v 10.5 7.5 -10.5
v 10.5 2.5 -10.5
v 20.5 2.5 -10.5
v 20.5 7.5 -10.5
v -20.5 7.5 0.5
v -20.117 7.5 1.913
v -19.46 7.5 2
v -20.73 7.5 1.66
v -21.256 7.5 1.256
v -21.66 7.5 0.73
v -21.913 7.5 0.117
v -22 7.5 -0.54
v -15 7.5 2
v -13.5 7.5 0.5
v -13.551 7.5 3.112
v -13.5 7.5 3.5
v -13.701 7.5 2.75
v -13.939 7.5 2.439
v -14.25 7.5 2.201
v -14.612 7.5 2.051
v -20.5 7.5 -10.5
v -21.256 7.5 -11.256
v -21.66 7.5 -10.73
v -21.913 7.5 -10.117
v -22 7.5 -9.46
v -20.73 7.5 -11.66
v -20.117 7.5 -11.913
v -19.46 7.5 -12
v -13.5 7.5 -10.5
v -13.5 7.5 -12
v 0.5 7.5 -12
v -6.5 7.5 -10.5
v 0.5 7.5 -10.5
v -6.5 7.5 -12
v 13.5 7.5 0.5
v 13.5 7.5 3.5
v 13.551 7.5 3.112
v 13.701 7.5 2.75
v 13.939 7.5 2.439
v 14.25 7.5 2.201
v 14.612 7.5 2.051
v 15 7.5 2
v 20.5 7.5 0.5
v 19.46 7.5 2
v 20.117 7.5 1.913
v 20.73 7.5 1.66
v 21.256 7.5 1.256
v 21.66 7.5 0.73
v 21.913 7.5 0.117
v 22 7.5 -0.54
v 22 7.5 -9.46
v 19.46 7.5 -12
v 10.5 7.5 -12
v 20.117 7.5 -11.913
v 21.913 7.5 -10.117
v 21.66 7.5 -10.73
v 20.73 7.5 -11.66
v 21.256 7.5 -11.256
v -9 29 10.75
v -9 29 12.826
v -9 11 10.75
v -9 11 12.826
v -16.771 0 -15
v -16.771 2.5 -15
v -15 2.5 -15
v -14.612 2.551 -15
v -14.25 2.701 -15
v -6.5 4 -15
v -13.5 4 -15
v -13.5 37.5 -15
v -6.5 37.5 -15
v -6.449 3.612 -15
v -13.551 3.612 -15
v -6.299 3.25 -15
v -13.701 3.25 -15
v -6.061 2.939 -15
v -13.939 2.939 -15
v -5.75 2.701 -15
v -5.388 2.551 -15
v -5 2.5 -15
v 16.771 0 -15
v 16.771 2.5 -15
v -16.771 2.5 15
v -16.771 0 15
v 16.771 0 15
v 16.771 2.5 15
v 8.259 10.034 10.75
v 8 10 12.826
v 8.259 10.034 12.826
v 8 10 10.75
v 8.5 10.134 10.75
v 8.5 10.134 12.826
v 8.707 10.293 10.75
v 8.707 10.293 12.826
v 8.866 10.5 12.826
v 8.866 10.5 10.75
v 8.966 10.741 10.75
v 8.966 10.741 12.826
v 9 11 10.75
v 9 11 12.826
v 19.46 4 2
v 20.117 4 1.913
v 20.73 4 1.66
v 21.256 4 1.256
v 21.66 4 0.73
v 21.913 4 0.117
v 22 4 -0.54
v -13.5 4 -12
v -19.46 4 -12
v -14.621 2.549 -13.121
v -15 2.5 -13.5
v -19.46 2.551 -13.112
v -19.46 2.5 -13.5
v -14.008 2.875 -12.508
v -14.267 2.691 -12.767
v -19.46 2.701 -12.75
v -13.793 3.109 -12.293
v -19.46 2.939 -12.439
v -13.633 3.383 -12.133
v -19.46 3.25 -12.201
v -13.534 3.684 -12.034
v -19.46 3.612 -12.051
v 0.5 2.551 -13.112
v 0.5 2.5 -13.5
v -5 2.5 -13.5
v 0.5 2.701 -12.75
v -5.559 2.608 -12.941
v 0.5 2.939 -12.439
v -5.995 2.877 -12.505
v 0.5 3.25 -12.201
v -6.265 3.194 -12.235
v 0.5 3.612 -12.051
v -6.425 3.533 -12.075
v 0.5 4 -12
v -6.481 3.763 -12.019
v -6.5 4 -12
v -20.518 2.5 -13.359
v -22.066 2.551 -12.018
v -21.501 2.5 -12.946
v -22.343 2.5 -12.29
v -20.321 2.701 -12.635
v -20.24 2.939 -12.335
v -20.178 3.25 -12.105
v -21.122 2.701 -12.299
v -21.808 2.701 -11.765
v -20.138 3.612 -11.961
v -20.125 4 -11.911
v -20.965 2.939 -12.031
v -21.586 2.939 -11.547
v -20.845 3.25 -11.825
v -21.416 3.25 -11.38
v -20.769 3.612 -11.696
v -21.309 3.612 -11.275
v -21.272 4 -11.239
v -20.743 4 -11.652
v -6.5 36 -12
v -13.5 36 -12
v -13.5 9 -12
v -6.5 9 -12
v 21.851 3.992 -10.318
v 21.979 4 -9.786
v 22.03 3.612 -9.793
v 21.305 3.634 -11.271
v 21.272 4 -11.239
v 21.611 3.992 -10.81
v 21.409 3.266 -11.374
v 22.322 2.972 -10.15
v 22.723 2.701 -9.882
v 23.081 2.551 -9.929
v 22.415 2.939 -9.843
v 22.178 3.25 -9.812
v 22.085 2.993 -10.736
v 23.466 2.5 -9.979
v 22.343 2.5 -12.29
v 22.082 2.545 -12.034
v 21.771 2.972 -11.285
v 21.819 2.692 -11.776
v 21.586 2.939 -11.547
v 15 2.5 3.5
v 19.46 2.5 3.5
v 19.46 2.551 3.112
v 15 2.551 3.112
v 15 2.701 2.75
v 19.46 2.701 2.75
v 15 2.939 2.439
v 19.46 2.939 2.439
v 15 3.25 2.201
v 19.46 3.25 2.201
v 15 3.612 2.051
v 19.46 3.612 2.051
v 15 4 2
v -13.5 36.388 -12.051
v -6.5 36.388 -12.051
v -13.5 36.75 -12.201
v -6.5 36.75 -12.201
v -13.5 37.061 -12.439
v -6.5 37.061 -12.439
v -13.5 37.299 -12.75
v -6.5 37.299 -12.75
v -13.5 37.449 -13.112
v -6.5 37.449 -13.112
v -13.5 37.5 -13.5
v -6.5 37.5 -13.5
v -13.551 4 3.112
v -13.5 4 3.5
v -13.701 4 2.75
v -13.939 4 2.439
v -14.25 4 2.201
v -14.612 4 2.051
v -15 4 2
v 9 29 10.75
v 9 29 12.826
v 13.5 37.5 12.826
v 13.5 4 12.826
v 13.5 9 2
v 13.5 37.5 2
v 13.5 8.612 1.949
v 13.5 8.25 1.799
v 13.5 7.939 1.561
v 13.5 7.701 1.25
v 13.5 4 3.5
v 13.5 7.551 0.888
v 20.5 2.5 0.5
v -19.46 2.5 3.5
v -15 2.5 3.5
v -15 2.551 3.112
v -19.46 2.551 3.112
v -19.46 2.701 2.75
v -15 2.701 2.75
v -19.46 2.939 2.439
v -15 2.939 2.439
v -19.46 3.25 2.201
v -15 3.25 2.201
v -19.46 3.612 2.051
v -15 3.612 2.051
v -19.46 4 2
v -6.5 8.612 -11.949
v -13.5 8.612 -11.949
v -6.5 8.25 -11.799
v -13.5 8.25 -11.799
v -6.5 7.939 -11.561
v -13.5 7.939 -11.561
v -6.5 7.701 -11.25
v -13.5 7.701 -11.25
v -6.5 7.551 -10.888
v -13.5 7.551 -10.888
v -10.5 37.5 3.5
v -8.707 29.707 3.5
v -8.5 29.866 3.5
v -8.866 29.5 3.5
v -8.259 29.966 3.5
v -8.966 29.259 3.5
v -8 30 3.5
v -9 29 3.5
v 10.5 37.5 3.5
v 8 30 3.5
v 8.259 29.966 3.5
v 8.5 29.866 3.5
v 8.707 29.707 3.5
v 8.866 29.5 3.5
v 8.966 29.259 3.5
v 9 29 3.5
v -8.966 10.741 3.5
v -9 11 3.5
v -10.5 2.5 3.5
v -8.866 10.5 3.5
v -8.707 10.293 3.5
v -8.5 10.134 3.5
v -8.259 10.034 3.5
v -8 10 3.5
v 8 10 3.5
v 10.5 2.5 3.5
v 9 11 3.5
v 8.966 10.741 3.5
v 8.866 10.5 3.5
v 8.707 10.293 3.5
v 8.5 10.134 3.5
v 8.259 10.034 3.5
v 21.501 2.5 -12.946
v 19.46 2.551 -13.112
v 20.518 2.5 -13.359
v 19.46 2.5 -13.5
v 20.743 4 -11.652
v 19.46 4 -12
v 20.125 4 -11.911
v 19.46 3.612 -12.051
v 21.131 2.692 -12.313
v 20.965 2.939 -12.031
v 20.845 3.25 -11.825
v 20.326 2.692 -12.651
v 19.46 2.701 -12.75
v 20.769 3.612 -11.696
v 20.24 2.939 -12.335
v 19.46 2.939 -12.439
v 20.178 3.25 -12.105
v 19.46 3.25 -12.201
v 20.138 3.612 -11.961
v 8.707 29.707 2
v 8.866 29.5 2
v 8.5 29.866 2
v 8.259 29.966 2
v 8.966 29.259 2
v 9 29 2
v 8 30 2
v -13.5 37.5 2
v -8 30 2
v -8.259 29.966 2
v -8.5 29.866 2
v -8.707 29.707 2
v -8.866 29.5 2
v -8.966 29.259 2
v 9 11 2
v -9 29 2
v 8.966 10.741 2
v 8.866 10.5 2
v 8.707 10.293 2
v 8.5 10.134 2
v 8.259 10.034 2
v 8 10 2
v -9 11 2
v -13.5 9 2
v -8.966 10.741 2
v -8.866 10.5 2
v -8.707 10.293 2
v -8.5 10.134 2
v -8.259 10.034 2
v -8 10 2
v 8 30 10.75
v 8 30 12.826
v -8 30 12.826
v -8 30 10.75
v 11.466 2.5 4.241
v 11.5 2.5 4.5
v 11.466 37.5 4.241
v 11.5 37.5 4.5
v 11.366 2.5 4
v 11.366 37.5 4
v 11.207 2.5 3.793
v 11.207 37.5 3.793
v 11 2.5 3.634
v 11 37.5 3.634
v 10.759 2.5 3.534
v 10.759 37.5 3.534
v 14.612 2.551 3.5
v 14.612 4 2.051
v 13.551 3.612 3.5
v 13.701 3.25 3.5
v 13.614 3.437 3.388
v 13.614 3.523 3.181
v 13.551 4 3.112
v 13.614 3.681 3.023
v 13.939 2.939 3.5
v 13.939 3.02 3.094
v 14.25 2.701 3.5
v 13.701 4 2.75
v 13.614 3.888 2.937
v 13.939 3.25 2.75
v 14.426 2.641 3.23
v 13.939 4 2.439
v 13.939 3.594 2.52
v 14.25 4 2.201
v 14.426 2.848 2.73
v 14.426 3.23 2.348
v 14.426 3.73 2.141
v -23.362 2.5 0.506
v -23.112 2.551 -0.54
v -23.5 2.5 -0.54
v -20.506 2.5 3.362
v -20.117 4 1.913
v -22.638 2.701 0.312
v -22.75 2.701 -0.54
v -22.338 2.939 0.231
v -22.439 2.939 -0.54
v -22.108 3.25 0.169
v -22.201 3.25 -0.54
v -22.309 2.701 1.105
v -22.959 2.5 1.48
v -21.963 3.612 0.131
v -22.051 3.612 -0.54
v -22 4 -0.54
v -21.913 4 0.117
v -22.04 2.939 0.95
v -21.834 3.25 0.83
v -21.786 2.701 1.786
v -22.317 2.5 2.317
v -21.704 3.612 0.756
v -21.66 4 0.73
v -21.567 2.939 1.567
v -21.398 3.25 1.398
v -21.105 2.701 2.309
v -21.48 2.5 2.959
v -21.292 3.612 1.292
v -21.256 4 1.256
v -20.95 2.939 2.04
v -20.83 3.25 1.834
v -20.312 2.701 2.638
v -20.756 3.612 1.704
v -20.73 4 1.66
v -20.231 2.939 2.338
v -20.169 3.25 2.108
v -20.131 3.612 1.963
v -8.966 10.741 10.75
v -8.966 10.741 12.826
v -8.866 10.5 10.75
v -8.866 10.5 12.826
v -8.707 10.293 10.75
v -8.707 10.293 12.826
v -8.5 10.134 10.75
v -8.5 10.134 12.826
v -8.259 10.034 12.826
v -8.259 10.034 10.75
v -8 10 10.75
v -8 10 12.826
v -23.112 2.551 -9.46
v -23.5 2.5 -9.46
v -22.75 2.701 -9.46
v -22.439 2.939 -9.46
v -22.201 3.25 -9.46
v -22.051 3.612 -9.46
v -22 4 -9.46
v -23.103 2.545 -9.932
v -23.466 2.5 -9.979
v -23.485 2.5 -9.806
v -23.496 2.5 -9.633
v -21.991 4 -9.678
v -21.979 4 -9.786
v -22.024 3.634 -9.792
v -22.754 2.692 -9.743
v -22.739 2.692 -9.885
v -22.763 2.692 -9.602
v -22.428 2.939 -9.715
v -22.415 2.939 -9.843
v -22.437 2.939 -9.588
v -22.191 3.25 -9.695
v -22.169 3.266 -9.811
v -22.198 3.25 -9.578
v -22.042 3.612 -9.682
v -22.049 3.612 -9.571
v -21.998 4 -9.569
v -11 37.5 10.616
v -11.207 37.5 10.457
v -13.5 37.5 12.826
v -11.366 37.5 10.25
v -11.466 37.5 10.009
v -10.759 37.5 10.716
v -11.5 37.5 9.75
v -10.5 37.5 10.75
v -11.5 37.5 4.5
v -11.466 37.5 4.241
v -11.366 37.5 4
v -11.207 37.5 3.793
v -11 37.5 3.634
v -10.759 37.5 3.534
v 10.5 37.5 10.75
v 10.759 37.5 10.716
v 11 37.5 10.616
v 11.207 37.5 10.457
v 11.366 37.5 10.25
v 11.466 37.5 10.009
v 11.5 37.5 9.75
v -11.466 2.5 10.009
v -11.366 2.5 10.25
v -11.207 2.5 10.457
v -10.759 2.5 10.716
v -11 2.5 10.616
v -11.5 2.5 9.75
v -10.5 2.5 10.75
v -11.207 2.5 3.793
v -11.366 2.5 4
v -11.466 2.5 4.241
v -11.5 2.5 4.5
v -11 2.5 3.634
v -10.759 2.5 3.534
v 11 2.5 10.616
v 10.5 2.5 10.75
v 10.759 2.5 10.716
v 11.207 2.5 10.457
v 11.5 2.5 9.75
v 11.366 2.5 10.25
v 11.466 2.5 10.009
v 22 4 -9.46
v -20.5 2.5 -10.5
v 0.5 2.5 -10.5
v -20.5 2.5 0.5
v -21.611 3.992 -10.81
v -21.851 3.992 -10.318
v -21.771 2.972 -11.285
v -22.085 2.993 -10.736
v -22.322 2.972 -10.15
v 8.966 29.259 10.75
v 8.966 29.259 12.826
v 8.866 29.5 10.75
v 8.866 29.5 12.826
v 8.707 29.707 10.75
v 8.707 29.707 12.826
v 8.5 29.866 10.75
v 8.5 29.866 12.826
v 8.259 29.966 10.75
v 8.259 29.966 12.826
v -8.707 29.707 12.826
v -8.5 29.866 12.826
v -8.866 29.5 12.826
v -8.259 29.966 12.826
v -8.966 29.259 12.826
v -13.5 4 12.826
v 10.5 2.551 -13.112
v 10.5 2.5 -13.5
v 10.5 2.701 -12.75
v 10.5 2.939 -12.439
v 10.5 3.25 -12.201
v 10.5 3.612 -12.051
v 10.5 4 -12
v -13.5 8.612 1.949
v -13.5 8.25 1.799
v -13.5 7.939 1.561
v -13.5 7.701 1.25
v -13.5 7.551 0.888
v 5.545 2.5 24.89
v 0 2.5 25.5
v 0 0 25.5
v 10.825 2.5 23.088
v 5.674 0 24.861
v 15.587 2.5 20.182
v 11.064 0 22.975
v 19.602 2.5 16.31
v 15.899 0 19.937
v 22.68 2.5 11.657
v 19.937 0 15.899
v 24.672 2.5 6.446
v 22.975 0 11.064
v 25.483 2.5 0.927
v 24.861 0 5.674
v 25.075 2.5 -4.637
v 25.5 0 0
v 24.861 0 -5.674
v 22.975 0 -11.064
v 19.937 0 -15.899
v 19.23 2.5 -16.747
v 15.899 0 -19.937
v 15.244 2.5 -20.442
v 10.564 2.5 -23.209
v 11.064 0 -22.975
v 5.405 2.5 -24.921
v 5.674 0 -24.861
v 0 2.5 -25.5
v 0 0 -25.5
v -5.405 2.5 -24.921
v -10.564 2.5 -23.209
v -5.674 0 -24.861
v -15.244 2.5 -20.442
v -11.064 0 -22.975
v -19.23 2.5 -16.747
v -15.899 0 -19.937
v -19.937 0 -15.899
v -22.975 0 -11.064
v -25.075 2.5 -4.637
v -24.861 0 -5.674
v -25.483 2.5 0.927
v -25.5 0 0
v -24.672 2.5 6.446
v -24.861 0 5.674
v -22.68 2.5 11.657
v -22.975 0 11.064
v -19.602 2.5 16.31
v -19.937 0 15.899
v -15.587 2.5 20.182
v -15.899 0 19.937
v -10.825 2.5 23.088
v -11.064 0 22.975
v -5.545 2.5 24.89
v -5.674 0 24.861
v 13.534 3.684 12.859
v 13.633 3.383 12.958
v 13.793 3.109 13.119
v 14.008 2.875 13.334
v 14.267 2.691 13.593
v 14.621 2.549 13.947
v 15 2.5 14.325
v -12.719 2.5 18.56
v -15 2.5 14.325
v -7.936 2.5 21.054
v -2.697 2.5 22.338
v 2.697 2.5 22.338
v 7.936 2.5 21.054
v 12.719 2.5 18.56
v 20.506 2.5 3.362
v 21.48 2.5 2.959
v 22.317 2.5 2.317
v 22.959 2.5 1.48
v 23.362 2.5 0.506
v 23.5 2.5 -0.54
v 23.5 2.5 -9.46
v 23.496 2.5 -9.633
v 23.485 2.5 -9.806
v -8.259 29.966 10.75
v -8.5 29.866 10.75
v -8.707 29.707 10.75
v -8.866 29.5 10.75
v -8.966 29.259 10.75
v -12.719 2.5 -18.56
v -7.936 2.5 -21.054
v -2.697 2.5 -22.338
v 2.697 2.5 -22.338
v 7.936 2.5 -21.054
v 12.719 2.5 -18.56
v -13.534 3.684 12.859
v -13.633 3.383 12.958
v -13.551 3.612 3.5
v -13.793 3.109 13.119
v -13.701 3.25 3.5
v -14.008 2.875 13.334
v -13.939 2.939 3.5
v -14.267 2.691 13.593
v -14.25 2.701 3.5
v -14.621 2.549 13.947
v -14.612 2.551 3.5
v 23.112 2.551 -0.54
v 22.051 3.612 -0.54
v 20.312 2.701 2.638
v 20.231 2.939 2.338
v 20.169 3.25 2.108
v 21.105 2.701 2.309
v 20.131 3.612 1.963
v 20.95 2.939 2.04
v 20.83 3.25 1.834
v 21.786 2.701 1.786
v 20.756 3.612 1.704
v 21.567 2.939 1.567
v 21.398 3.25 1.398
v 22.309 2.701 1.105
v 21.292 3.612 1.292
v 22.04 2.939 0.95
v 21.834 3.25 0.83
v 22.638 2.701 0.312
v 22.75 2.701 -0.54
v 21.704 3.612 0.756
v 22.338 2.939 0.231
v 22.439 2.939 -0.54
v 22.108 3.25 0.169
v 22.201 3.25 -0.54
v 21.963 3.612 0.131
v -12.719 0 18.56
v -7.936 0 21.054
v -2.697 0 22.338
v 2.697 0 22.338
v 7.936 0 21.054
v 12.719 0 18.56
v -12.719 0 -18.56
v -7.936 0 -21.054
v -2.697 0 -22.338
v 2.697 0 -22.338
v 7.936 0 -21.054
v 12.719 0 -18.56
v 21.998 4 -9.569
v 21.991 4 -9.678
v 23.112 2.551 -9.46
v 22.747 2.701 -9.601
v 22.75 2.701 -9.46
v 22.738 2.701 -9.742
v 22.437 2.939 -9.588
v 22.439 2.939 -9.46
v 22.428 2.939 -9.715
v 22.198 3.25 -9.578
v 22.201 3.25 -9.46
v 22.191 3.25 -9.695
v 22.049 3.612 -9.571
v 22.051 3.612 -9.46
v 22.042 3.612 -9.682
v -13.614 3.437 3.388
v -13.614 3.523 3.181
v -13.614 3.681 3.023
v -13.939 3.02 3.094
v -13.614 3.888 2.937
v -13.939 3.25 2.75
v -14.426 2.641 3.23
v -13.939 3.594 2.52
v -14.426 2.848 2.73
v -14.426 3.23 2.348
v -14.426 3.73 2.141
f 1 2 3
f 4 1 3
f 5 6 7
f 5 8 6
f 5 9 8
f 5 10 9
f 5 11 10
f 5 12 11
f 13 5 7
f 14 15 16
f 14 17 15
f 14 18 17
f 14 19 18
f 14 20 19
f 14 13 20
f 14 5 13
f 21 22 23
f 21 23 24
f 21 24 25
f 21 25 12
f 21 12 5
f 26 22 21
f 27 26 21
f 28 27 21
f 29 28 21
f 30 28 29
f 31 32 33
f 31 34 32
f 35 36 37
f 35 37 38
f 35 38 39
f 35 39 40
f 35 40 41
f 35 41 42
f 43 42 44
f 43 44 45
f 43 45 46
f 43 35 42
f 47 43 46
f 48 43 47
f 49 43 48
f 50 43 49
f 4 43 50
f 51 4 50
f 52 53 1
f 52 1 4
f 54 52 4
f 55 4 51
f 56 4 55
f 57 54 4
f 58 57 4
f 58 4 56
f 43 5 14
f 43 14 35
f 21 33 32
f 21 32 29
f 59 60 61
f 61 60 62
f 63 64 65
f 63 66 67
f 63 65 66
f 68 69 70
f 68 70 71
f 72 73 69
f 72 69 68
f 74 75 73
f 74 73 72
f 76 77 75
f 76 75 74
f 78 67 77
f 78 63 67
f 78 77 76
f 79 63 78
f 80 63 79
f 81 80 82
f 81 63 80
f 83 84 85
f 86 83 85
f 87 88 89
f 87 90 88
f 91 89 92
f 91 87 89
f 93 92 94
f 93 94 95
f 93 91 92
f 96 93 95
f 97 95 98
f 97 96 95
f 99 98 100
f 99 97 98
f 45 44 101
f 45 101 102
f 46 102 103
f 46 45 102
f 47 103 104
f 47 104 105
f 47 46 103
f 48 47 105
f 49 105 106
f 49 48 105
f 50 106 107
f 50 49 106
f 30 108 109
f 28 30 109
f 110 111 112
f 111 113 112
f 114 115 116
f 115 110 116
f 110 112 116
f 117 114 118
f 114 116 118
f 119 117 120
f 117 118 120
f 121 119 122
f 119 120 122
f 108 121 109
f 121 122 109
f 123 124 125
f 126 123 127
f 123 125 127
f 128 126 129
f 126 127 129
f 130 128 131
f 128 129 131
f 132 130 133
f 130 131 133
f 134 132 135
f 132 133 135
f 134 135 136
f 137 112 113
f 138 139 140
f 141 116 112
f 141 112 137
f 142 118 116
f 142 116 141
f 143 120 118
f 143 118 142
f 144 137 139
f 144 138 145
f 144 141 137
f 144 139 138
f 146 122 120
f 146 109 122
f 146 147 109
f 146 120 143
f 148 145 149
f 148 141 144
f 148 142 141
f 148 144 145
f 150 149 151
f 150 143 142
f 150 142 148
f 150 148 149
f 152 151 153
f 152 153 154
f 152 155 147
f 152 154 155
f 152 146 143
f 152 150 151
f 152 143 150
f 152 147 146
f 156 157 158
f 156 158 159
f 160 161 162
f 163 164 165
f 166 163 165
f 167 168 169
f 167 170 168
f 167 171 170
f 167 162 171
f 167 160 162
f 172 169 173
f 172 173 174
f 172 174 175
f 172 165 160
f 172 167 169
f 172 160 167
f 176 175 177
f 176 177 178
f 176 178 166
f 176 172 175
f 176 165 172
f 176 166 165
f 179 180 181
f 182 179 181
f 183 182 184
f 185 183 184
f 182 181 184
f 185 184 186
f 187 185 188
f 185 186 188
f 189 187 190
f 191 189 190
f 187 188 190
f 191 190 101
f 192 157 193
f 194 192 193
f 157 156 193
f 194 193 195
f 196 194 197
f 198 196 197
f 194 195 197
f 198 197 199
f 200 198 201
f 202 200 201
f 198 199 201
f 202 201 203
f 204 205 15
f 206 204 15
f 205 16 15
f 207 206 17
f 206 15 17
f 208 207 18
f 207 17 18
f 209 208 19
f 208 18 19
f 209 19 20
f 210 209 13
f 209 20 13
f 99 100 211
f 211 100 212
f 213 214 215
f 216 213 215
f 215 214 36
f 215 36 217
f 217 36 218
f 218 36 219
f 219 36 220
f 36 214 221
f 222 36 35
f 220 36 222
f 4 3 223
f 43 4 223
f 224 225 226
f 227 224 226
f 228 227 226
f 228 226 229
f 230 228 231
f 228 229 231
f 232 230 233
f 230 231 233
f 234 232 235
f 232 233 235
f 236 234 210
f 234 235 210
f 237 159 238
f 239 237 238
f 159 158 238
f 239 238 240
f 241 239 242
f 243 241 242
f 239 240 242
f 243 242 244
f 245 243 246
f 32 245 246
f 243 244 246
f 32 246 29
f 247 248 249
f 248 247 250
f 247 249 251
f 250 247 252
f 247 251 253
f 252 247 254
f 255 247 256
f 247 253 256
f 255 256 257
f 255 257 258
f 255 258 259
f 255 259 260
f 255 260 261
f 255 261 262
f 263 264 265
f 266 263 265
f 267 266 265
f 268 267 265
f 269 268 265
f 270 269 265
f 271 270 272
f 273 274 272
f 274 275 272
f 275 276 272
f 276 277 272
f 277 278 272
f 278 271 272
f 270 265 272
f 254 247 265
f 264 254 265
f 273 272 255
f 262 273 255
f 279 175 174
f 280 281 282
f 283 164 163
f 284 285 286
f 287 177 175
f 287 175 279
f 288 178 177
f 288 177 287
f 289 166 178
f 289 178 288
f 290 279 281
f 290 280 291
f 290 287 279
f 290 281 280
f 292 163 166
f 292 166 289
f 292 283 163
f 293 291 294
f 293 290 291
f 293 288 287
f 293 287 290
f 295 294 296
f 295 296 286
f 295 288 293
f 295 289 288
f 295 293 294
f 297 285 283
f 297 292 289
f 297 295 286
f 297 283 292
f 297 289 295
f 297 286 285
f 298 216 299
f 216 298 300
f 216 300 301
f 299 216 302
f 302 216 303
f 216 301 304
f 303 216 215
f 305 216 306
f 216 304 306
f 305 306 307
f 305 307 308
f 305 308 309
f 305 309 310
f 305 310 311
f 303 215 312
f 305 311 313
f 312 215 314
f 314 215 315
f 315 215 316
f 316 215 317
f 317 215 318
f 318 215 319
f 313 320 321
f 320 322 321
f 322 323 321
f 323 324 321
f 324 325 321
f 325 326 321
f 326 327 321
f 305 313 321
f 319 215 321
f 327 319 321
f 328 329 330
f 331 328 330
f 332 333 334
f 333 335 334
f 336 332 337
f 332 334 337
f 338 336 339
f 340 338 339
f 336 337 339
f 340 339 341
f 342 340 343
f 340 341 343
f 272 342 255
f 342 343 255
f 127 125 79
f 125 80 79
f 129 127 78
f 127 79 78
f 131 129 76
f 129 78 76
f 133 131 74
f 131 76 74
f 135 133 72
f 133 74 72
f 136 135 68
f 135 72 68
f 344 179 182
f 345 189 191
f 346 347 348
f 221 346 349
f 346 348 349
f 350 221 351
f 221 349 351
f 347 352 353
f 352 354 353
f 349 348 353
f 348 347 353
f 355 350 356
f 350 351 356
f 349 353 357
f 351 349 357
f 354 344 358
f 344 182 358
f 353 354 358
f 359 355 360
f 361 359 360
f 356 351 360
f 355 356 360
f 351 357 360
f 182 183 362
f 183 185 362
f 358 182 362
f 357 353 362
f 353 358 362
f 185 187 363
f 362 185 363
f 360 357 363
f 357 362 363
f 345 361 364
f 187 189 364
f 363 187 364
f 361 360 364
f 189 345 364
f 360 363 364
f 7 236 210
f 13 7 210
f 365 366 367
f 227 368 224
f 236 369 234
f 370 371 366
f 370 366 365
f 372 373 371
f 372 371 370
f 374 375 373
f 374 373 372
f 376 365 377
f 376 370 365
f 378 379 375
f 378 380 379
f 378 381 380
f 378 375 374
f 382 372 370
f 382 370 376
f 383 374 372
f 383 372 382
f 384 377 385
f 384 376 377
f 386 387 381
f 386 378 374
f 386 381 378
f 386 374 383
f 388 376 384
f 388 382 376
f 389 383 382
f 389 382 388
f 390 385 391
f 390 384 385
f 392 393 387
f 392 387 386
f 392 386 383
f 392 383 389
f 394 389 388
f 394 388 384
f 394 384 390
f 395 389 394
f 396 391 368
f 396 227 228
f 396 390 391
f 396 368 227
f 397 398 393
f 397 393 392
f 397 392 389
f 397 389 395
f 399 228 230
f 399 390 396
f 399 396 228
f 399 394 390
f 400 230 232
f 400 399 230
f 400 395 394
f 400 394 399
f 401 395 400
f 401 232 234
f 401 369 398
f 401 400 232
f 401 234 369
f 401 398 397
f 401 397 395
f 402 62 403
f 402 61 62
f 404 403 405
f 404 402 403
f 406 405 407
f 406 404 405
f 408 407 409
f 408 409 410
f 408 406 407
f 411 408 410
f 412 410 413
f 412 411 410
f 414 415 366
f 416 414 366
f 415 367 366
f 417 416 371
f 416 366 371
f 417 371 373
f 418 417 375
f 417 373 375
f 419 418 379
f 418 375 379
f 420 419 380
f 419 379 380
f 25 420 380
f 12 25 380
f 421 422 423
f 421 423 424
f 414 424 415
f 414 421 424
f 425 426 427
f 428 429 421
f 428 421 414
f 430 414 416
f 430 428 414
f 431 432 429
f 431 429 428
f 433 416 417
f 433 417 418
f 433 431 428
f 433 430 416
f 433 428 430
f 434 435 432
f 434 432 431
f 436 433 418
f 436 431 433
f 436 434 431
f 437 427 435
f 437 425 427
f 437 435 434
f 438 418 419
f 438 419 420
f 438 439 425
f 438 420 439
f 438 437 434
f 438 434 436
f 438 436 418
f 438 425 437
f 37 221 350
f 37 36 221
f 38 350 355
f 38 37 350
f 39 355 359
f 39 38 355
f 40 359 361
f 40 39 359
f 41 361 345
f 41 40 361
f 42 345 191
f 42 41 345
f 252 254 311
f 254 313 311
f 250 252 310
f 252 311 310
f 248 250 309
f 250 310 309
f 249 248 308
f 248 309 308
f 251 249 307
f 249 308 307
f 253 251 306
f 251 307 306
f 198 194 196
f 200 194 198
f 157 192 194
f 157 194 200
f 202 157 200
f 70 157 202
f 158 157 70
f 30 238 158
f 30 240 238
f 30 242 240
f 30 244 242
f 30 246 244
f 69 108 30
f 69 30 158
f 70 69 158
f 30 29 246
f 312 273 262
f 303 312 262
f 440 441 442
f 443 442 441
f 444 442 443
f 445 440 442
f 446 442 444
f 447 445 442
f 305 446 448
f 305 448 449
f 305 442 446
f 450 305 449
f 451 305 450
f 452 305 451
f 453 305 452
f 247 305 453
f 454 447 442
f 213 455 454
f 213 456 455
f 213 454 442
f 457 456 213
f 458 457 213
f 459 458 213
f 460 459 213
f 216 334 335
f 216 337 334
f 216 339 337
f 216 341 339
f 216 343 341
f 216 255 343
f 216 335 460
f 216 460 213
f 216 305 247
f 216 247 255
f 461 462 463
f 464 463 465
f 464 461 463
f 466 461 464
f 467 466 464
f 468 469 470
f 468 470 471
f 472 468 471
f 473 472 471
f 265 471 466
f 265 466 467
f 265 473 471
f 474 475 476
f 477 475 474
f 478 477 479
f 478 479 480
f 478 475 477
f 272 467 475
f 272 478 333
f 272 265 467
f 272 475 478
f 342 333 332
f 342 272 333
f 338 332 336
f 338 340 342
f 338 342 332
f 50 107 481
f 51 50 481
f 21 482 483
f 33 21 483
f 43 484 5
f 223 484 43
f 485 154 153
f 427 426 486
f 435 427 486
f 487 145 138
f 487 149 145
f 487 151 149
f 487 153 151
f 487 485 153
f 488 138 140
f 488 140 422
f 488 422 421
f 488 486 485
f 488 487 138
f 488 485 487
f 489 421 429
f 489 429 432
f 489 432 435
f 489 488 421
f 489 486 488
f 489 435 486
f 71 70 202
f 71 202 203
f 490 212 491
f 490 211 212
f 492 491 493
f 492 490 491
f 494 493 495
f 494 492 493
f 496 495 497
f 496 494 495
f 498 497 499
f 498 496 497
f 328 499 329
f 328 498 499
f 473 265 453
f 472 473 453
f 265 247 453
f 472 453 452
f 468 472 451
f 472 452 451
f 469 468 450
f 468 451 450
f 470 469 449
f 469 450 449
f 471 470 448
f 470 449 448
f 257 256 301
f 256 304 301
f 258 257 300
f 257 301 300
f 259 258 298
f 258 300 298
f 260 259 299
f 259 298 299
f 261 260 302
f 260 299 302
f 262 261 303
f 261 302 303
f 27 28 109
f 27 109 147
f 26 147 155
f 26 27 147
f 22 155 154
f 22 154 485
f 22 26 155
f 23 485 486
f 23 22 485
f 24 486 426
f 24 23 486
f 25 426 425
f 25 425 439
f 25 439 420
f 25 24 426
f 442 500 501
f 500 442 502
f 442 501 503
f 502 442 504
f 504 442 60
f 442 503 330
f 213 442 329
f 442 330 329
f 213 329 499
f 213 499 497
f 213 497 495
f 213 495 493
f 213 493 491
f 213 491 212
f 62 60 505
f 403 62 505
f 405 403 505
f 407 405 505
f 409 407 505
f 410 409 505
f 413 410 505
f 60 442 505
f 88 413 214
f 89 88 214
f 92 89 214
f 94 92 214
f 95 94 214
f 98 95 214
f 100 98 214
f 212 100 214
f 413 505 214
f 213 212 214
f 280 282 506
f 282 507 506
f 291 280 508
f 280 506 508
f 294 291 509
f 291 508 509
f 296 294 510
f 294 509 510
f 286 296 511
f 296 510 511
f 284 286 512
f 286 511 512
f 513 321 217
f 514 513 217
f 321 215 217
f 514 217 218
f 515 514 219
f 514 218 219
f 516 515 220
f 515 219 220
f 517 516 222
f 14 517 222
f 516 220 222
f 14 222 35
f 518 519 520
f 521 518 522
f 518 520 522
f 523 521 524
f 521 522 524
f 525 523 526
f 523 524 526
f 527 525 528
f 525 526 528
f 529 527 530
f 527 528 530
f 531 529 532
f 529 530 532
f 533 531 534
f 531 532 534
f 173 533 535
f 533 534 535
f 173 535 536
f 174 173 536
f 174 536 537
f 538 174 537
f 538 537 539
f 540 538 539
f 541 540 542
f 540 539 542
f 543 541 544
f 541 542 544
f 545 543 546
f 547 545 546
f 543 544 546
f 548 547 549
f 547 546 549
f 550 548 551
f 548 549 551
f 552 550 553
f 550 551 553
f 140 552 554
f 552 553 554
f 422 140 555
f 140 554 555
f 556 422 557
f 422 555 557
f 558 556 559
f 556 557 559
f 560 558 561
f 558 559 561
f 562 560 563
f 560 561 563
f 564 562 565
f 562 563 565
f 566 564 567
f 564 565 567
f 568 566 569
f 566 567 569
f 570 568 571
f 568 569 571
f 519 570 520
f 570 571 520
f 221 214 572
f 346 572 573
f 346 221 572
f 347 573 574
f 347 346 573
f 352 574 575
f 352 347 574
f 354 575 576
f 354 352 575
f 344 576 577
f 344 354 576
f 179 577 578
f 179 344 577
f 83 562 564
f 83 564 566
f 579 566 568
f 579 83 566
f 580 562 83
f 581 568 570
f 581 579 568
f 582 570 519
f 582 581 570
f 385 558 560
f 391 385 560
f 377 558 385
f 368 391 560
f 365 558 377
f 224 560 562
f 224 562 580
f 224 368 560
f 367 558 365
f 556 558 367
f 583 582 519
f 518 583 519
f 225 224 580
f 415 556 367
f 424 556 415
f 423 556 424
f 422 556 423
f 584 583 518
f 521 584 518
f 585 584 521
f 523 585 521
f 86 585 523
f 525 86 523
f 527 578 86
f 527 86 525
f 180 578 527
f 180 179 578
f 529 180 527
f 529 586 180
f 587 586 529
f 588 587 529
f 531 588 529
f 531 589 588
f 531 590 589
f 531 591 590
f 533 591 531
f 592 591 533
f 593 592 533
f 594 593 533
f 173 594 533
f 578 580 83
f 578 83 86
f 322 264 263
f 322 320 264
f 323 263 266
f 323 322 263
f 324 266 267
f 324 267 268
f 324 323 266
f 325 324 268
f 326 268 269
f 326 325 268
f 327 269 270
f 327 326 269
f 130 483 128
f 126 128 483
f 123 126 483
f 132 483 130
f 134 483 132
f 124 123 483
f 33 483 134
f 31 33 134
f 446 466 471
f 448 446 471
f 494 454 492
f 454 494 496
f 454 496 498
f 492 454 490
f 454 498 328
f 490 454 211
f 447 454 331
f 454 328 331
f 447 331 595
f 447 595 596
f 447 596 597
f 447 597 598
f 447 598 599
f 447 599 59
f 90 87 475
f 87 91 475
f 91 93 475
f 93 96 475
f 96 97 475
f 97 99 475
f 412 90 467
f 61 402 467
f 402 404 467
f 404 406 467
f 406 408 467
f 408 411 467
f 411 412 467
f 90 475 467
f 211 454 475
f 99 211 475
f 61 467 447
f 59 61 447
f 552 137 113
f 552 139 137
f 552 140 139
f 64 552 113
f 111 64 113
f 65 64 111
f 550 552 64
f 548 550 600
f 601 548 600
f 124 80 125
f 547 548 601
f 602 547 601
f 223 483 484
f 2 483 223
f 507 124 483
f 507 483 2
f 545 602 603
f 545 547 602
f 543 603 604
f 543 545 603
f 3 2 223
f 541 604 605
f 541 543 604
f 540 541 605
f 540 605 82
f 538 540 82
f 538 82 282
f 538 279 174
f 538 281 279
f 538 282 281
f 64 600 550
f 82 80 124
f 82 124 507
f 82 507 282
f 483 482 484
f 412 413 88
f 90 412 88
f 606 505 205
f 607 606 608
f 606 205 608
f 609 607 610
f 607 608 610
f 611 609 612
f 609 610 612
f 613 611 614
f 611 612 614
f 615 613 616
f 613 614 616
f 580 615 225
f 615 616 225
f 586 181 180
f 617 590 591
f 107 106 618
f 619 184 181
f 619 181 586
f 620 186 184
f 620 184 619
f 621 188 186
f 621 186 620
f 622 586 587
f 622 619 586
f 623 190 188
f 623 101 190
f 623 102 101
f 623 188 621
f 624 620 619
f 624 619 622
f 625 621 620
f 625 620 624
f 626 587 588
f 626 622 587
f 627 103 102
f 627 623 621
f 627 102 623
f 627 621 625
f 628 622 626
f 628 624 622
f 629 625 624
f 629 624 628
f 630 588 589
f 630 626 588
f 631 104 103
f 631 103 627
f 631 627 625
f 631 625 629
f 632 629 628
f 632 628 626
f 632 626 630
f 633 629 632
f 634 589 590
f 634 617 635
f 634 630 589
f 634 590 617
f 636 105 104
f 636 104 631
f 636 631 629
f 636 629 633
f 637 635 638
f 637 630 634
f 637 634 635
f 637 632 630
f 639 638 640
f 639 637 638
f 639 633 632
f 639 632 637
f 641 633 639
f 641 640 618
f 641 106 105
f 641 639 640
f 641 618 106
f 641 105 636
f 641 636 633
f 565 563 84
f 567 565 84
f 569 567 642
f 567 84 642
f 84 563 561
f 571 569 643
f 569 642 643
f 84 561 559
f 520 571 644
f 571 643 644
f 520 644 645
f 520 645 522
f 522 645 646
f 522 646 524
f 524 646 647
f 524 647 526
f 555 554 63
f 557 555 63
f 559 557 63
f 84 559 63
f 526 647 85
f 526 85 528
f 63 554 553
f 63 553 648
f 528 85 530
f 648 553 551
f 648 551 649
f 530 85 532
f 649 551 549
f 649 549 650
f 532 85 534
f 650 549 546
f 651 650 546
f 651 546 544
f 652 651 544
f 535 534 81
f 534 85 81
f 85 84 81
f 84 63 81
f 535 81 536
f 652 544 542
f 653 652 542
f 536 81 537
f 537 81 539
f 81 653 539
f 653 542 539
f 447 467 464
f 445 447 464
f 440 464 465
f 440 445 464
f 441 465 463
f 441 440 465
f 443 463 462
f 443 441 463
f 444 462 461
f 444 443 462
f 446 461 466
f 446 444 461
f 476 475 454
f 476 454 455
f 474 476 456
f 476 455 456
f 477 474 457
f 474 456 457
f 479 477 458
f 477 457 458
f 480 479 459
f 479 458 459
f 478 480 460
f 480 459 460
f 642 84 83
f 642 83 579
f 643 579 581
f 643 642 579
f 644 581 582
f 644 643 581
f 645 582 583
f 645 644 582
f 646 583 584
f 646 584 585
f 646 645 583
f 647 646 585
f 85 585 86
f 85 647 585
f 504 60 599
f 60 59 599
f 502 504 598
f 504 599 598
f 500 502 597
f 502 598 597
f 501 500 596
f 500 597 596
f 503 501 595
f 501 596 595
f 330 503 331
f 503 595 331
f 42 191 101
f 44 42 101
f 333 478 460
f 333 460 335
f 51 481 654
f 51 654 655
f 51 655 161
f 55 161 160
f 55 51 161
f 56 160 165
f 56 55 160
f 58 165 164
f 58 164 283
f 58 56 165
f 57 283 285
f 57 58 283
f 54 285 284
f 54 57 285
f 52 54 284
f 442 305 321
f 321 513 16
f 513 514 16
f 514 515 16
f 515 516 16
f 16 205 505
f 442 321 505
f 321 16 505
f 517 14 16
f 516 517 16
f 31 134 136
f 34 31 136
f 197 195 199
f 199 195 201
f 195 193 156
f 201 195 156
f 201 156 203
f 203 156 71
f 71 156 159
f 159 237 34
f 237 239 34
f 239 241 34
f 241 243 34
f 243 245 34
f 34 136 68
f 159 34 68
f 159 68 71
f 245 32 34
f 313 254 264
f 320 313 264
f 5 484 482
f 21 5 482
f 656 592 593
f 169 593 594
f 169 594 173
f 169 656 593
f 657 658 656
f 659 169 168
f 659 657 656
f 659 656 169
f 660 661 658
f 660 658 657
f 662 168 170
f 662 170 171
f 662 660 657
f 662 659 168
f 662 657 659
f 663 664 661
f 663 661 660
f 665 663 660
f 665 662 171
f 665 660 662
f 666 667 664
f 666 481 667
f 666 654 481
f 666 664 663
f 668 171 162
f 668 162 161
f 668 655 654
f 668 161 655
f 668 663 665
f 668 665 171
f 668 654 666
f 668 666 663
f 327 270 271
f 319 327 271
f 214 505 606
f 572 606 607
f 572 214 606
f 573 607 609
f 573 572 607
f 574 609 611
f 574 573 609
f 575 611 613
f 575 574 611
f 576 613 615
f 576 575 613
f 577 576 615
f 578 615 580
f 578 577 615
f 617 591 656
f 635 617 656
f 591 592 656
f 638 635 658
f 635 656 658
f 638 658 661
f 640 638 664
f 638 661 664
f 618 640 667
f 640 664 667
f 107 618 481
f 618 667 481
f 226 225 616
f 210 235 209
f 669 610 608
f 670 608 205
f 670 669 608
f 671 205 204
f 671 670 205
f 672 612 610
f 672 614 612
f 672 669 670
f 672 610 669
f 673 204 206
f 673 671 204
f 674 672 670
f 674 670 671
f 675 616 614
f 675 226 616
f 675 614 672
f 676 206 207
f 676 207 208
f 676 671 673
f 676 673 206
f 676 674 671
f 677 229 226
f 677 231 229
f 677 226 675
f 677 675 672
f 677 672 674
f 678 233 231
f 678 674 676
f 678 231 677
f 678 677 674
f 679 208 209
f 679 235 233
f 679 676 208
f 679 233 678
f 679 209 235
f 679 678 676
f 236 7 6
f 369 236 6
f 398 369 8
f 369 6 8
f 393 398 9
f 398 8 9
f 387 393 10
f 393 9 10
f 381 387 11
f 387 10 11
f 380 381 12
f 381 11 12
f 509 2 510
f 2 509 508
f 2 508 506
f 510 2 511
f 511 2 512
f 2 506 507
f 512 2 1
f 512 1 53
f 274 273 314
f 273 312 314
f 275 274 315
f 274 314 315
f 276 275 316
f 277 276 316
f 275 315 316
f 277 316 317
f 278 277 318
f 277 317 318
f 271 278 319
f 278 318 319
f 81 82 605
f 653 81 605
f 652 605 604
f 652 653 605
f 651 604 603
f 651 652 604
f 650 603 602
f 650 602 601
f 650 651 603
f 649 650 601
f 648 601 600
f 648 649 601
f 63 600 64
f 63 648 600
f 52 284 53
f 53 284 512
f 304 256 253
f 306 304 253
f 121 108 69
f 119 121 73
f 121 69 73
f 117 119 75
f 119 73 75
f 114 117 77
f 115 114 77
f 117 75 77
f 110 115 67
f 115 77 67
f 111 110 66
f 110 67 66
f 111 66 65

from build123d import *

# Parameters (mm, degrees)
SKETCH1_R           = 25.5
SKETCH1_R_2         = 22.5
SKETCH1_W           = 33.541019662
SKETCH1_H           = 30
BOSS_EXTRUDE1_DEPTH = 2.5
SKETCH2_W           = 1.5
SKETCH2_H           = 1.5
SKETCH2_W_2         = 41
BOSS_EXTRUDE2_DEPTH = 5
FILLET1_R           = 2.54
SKETCH3_W           = 10
SKETCH3_H           = 1.5
CUT_EXTRUDE1_DEPTH  = 5
SKETCH4_W           = 7
SKETCH4_H           = 3
BOSS_EXTRUDE3_DEPTH = 35
FILLET2_R           = 1.5
FILLET3_R           = 1.5
SKETCH5_W           = 11.5
SKETCH5_H           = 0.25
SKETCH5_H_2         = 1.25
SKETCH5_W_2         = 2
SKETCH5_H_3         = 7.25
BOSS_EXTRUDE5_DEPTH = 35
FILLET4_R           = 1.5
FILLET5_R           = 1.5
FILLET6_R           = 1
SKETCH6_W           = 9
SKETCH6_H           = 10
CUT_EXTRUDE3_DEPTH  = 19.76
FILLET7_R           = 1


with BuildPart() as part:
    # Sketch1 → Boss-Extrude1 (new body)
    # profile 1 of 4: a face of its own
    with BuildSketch(Plane(origin=(0, 0, 0), x_dir=(1, 0, 0), z_dir=(0, 1, 0))):
        with Locations(Location((0, 0, 0), (0, 0, 270))):
            Circle(SKETCH1_R)
        Circle(SKETCH1_R_2, mode=Mode.SUBTRACT)
    # profile 2 of 4: a face of its own
    with BuildSketch(Plane(origin=(0, 0, 0), x_dir=(1, 0, 0), z_dir=(0, 1, 0))):
        Rectangle(SKETCH1_W, SKETCH1_H)
    # profile 3 of 4: a face of its own
    with BuildSketch(Plane(origin=(0, 0, 0), x_dir=(1, 0, 0), z_dir=(0, 1, 0))):
        with BuildLine():
            ThreePointArc((22.5, 0), (21.018878077, 8.02849702), (16.770509831, 15))
            Line((16.770509831, 15), (16.770509831, -15))
            ThreePointArc((16.770509831, -15), (21.018878077, -8.02849702), (22.5, 0))
        make_face()
    # profile 4 of 4: a face of its own
    with BuildSketch(Plane(origin=(0, 0, 0), x_dir=(1, 0, 0), z_dir=(0, 1, 0))):
        with BuildLine():
            Line((-16.770509831, -15), (-16.770509831, 15))
            ThreePointArc((-16.770509831, 15), (-22.5, 0), (-16.770509831, -15))
        make_face()
    extrude(amount=BOSS_EXTRUDE1_DEPTH)

    # Sketch2 → Boss-Extrude2 (add)
    with BuildSketch(Plane(origin=(0, 2.5, 0), x_dir=(1, 0, 0), z_dir=(0, 1, 0))):
        Polygon((-20.5, -0.5), (-20.5, 5.5), (-20.5, 10.5), (-22, 10.5), (-22, -0.5), align=None)
        with Locations((-21.25, -1.25)):
            Rectangle(SKETCH2_W, SKETCH2_H)
        with Locations((0, -1.25)):
            Rectangle(SKETCH2_W_2, SKETCH2_H)
        Polygon((20.5, 10.5), (20.5, 5.5), (20.5, -0.5), (20.5, -2), (22, -2), (22, 12), (20.5, 12), align=None)
        Polygon((-20.5, 10.5), (20.5, 10.5), (20.5, 12), (-22, 12), (-22, 10.5), align=None)
    extrude(amount=BOSS_EXTRUDE2_DEPTH)

    # Fillet1
    fillet1_edges = [part.edges().sort_by_distance(p)[0] for p in [
        (-22, 5, -12),
        (-22, 5, 2),
        (22, 5, 2),
        (22, 5, -12),
    ]]
    fillet(fillet1_edges, radius=FILLET1_R)

    # Sketch3 → Cut-Extrude1 (cut)
    with BuildSketch(Plane(origin=(0, 7.5, 0), x_dir=(1, 0, 0), z_dir=(0, 1, 0))):
        with Locations((5.5, 11.25)):
            Rectangle(SKETCH3_W, SKETCH3_H)
    extrude(amount=-CUT_EXTRUDE1_DEPTH, mode=Mode.SUBTRACT)

    # Sketch4 → Boss-Extrude3 (add)
    with BuildSketch(Plane(origin=(0, 2.5, 0), x_dir=(1, 0, 0), z_dir=(0, 1, 0))):
        with Locations((-10, 13.5)):
            Rectangle(SKETCH4_W, SKETCH4_H)
    extrude(amount=BOSS_EXTRUDE3_DEPTH)

    # Fillet2
    fillet2_edges = [part.edges().sort_by_distance(p)[0] for p in [
        (-10, 7.5, -12),
        (-3, 2.5, -12),
        (-6.5, 2.5, -13.5),
        (-13.5, 2.5, -13.5),
        (0, 2.5, 2),
        (-22, 2.5, -5),
        (22, 2.5, -5),
        (-16.48, 2.5, -12),
        (-21.256051224, 2.5, 1.256051224),
        (21.256051224, 2.5, 1.256051224),
        (21.256051224, 2.5, -11.256051224),
        (-21.256051224, 2.5, -11.256051224),
        (14.98, 2.5, -12),
    ]]
    fillet(fillet2_edges, radius=FILLET2_R - 0.0001)  # a hair under: the kernel refuses the full size

    # Fillet3
    fillet3_edges = [part.edges().sort_by_distance(p)[0] for p in [
        (-10, 37.5, -12),
    ]]
    fillet(fillet3_edges, radius=FILLET3_R)

    # Sketch5 → Boss-Extrude5 (add)
    with BuildSketch(Plane(origin=(0, 2.5, 0), x_dir=(1, 0, 0), z_dir=(0, 1, 0))):
        with Locations((-5.75, -2.125)):
            Rectangle(SKETCH5_W, SKETCH5_H)
        with Locations((-5.75, -2.875)):
            Rectangle(SKETCH5_W, SKETCH5_H_2)
        with Locations((5.75, -2.875)):
            Rectangle(SKETCH5_W, SKETCH5_H_2)
        with Locations((5.75, -2.125)):
            Rectangle(SKETCH5_W, SKETCH5_H)
        Polygon((13.5, -2), (11.5, -2), (11.5, -2.25), (11.5, -3.5), (13.5, -3.5), align=None)
        with Locations((12.5, -7.125)):
            Rectangle(SKETCH5_W_2, SKETCH5_H_3)
        Polygon((11.5, -10.75), (-11.5, -10.75), (-13.5, -10.75), (-13.5, -12.825519341), (13.5, -12.825519341), (13.5, -10.75), align=None)
        with Locations((-12.5, -7.125)):
            Rectangle(SKETCH5_W_2, SKETCH5_H_3)
        Polygon((-11.5, -2.25), (-11.5, -2), (-13.5, -2), (-13.5, -3.5), (-11.5, -3.5), align=None)
    extrude(amount=BOSS_EXTRUDE5_DEPTH)

    # Fillet4
    fillet4_edges = [part.edges().sort_by_distance(p)[0] for p in [
        (0, 7.5, 2),
    ]]
    fillet(fillet4_edges, radius=FILLET4_R - 0.0001)  # a hair under: the kernel refuses the full size

    # Fillet5
    fillet5_edges = [part.edges().sort_by_distance(p)[0] for p in [
        (-13.5, 2.939310539, 2.439310539),
        (13.5, 2.939310539, 2.439310539),
        (13.5, 2.5, 8.16270967),
        (13.5, 5.74995, 2),
        (-13.5, 5.74995, 2),
        (0, 2.5, 12.825519341),
        (-13.5, 2.5, 8.16270967),
    ]]
    fillet(fillet5_edges, radius=FILLET5_R - 0.0001)  # a hair under: the kernel refuses the full size

    # Fillet6
    fillet6_edges = [part.edges().sort_by_distance(p)[0] for p in [
        (11.5, 20, 3.5),
        (11.5, 20, 10.75),
        (-11.5, 20, 10.75),
        (-11.5, 20, 3.5),
    ]]
    fillet(fillet6_edges, radius=FILLET6_R)

    # Sketch6 → Cut-Extrude3 (cut)
    with BuildSketch(Plane.XY.offset(12.825519341)):
        with Locations((-4.5, 25)):
            Rectangle(SKETCH6_W, SKETCH6_H)
        Polygon((9, 30), (0, 30), (0, 20), (-9, 20), (-9, 10), (9, 10), align=None)
    extrude(amount=-CUT_EXTRUDE3_DEPTH, mode=Mode.SUBTRACT)

    # Fillet7
    fillet7_edges = [part.edges().sort_by_distance(p)[0] for p in [
        (-9, 30, 11.78775967),
        (9, 30, 11.78775967),
        (9, 10, 11.78775967),
        (-9, 10, 11.78775967),
        (-9, 30, 2.75),
        (9, 30, 2.75),
        (9, 10, 2.75),
        (-9, 10, 2.75),
    ]]
    fillet(fillet7_edges, radius=FILLET7_R)


solid = part.part
